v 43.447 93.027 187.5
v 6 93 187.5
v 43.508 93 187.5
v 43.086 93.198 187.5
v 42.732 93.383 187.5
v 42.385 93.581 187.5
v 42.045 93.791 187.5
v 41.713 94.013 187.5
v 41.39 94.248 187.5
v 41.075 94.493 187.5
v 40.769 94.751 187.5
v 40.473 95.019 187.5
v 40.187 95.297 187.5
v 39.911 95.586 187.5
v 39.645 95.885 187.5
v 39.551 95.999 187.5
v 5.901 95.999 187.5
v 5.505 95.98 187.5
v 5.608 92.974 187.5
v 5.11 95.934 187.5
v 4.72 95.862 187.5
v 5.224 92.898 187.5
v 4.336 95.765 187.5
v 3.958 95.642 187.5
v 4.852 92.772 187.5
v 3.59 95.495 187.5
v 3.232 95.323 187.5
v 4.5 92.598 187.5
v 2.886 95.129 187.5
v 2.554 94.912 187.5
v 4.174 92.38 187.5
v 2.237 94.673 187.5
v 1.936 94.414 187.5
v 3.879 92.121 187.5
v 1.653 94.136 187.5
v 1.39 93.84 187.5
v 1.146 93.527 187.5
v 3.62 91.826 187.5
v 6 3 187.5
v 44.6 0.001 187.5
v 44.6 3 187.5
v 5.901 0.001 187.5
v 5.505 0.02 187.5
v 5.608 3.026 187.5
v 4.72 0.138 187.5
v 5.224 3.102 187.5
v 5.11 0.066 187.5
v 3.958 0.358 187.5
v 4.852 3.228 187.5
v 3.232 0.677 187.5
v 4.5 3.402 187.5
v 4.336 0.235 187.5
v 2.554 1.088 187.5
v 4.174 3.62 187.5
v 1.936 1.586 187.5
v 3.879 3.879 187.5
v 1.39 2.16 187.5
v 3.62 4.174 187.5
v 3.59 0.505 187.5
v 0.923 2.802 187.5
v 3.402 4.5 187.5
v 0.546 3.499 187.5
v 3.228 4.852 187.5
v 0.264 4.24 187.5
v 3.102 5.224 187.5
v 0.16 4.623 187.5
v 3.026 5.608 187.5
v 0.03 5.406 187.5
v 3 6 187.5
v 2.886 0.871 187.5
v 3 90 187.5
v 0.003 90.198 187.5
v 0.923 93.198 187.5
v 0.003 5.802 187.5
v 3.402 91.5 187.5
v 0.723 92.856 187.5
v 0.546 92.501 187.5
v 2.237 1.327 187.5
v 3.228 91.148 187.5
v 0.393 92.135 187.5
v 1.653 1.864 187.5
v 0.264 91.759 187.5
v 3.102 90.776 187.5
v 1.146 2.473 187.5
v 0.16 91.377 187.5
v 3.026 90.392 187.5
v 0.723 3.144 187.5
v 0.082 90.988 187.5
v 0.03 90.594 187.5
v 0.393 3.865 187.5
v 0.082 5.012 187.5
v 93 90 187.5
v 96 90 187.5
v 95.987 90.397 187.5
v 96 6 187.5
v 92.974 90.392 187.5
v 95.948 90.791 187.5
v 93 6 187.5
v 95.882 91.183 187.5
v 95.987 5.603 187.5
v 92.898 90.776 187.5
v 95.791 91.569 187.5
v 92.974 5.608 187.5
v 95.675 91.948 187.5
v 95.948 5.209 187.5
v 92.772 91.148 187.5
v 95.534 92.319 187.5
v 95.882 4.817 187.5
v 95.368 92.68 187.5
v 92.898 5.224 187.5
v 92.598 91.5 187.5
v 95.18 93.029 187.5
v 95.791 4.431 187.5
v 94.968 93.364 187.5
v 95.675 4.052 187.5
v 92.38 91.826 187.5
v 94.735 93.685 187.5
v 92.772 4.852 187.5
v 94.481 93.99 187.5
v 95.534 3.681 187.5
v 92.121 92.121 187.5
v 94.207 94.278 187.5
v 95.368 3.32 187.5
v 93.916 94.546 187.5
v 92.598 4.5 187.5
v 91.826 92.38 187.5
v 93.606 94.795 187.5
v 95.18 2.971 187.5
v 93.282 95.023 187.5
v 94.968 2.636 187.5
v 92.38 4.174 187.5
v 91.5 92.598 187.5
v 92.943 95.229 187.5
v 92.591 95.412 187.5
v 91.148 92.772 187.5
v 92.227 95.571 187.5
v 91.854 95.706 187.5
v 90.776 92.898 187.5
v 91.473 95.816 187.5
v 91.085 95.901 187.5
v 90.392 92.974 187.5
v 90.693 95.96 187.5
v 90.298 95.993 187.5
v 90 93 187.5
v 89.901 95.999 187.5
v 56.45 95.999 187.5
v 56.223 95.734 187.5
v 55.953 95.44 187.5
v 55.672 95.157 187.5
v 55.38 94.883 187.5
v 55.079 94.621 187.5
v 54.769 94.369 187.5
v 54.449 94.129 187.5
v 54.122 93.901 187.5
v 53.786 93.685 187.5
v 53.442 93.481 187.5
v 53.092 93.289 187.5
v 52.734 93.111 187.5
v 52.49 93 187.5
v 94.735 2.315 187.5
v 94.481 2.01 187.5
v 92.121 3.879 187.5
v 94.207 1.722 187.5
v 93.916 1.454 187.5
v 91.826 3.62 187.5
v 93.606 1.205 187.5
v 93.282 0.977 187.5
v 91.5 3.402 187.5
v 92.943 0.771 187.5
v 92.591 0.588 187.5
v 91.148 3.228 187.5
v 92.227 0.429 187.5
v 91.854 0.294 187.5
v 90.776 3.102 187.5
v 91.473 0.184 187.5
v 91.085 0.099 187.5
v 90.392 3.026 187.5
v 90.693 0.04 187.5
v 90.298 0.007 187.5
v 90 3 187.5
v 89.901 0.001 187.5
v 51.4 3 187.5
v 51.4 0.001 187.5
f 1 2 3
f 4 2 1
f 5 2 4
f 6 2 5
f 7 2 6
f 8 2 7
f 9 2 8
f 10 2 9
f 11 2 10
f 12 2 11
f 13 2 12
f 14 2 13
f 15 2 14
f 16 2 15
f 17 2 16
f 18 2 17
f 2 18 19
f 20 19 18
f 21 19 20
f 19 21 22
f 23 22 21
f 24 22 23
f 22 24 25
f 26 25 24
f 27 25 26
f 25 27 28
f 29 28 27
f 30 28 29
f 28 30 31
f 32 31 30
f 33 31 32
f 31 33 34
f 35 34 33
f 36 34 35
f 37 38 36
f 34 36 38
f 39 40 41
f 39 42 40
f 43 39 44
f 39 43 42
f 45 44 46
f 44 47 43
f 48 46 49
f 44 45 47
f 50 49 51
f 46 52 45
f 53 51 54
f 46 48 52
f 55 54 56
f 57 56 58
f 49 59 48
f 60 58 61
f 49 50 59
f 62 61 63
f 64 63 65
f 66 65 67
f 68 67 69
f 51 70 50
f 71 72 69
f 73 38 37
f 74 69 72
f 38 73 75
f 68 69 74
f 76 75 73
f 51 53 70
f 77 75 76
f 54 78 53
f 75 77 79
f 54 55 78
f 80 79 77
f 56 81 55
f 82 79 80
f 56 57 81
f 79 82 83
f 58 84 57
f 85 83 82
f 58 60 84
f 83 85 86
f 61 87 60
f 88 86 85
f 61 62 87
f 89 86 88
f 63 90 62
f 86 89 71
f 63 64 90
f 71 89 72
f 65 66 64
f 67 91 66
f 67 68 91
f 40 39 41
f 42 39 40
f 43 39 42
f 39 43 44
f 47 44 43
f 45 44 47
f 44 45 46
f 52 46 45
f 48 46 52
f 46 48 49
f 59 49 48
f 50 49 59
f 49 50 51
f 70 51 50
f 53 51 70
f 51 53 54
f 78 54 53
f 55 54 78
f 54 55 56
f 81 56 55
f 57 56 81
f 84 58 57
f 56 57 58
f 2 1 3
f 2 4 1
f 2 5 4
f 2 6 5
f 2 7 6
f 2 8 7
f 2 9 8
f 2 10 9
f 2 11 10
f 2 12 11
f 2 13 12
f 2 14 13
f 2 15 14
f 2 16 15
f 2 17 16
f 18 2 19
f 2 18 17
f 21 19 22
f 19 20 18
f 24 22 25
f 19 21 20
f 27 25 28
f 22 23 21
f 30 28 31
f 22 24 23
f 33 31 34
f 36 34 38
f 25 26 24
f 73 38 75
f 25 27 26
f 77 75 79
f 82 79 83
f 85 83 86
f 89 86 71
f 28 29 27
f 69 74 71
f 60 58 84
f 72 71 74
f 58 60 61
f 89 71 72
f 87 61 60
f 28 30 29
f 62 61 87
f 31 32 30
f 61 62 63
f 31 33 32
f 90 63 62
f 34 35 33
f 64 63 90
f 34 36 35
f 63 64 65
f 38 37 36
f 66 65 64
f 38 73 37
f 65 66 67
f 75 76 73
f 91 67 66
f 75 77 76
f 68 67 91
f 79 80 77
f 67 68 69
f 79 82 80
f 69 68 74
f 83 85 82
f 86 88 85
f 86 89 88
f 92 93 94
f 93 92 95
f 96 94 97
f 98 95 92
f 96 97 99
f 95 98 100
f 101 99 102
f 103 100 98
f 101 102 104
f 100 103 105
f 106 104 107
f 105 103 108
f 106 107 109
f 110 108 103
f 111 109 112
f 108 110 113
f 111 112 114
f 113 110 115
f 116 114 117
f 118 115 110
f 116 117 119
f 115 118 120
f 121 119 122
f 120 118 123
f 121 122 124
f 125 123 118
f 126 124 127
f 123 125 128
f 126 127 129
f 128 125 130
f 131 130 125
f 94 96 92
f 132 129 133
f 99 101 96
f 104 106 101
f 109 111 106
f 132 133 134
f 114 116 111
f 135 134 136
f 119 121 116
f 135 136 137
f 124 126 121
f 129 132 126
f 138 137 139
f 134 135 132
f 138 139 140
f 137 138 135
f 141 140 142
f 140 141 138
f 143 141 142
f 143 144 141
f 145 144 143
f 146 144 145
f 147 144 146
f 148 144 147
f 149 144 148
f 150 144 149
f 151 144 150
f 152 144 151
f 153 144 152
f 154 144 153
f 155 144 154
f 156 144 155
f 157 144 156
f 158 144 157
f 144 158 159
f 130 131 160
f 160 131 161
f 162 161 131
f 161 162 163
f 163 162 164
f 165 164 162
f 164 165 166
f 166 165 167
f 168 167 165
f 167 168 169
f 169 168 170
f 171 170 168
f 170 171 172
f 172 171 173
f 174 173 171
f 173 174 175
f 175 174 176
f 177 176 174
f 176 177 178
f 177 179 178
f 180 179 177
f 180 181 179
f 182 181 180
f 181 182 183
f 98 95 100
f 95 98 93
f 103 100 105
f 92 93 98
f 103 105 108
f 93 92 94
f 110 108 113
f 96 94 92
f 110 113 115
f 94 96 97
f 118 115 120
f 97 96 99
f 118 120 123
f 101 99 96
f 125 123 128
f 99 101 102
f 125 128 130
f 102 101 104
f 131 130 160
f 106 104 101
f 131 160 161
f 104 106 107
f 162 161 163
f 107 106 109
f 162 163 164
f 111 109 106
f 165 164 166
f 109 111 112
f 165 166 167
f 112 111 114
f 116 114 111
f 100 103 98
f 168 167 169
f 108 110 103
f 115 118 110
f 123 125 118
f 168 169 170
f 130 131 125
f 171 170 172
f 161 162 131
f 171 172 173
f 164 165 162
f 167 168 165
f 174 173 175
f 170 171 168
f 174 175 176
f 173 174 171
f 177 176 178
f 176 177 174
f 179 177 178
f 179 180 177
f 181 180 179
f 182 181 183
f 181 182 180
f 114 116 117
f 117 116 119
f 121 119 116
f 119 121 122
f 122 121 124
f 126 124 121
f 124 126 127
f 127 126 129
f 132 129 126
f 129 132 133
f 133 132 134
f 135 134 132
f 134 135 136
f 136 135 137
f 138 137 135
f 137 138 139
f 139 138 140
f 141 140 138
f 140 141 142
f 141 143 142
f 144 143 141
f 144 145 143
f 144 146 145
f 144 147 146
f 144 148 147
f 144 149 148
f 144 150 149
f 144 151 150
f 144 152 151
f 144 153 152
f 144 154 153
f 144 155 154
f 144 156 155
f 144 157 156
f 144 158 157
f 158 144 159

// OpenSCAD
// file: lid.scad
// ─────────────────────────────────────────────────────────────
//  Chamber lid — plate seats on the chamber rim, spigot locates
//  it in the cavity, fill collar points DOWN into the headspace.
//
//  PRINT PLATE-TOP-DOWN (the smooth face on the bed). Spigot and
//  collar both rise from the bed: zero overhangs, and the seating
//  face is a bed-flat surface rather than a drooping ledge.
//
//  Origin is the plate's underside = the chamber rim.
// ─────────────────────────────────────────────────────────────
include <params.scad>

fill_port_d   = 38;
fill_collar_h = 8;
fill_wall     = 2.5;

spigot        = ch_inner - 2*lid_fit;
fill_cx       = ch_outer/2;
fill_cy       = ch_outer*0.34;
vent_ring_r   = fill_port_d/2 + fill_wall + 5;

module lid() {
    difference() {
        union() {
            translate([0, 0, 0])
                rbox(ch_outer, ch_outer, lid_t, ch_corner_r);
            // locating spigot, into the cavity
            translate([(ch_outer - spigot)/2, (ch_outer - spigot)/2, -lid_spigot_h])
                rbox(spigot, spigot, lid_spigot_h + eps, max(ch_corner_r - ch_wall, 1));
            // fill collar, downward
            translate([fill_cx, fill_cy, -fill_collar_h])
                cylinder(d = fill_port_d + 2*fill_wall, h = fill_collar_h + eps);
        }
        // fill port
        translate([fill_cx, fill_cy, -fill_collar_h - eps])
            cylinder(d = fill_port_d, h = fill_collar_h + lid_t + 2*eps);
        // make-up air vents
        translate([fill_cx, fill_cy, -lid_spigot_h - eps])
            for (i = [0 : vent_n - 1])
                rotate([0, 0, i*360/vent_n])
                    translate([vent_ring_r, 0, 0])
                        cylinder(d = vent_d, h = lid_spigot_h + lid_t + 2*eps);
        // cable notch, aligned with the chamber's
        translate([ch_outer/2 - cable_notch_w/2, -eps, -lid_spigot_h - eps])
            cube([cable_notch_w, ch_wall + eps, lid_spigot_h + lid_t + 2*eps]);
        // finger cutout for lifting
        translate([ch_outer/2, ch_outer + lid_finger_d*0.32, -lid_spigot_h - eps])
            cylinder(d = lid_finger_d, h = lid_spigot_h + lid_t + 2*eps);
    }
}

lid();
// file: chamber.scad
// ─────────────────────────────────────────────────────────────
//  Fog chamber — holds the mist maker under its water column.
//  Prints upright, open side up: no support anywhere.
//  Material: PETG, 100 um, >=4 perimeters, >=40% infill.
// ─────────────────────────────────────────────────────────────
include <params.scad>

mark_len_fill   = 30;   // longer rib = FILL TO HERE
mark_len_refill = 16;   // shorter rib = REFILL WHEN LEVEL REACHES HERE
mark_out        = 0.8;  // protrusion into the cavity
mark_h          = 1.5;

module chamber() {
    difference() {
        union() {
            rbox(ch_outer, ch_outer, ch_floor + ch_inner_h, ch_corner_r);
            // fog outlet spigot (teardrop = self-supporting)
            translate([ch_outer/2, ch_outer - eps, ch_floor + fog_port_z])
                teardrop(fog_port_d + 2*fog_boss_wall, fog_boss_len);
            // level ribs, RAISED on the inner wall so they neither thin the
            // wall nor trap grime, and are visible with the lid off
            for (m = [[water_fill, mark_len_fill], [water_refill, mark_len_refill]])
                translate([ch_wall, ch_outer/2 - m[1]/2, ch_floor + m[0]])
                    cube([mark_out, m[1], mark_h]);
        }

        // cavity
        translate([ch_wall, ch_wall, ch_floor])
            rbox(ch_inner, ch_inner, ch_inner_h + eps, max(ch_corner_r - ch_wall, 1));


        // fog outlet bore
        translate([ch_outer/2, ch_inner/2, ch_floor + fog_port_z])
            teardrop(fog_port_d, ch_outer);

        // module locating recess
        translate([ch_outer/2, ch_outer/2, -eps])
            cylinder(d = mm_module_od + 1.0, h = mm_recess_d + eps);

        // cable exit notch in the rim — no wall penetration below water
        translate([ch_outer/2 - cable_notch_w/2, -eps,
                   ch_floor + ch_inner_h - cable_notch_h])
            cube([cable_notch_w, ch_wall + 2*eps, cable_notch_h + eps]);
    }
}

chamber();
// file: params.scad
// ─────────────────────────────────────────────────────────────
//  Automated Snail Terrarium — shared parameters
//  Every dimension in the project comes from here. Change a
//  number, re-run ./build.sh, get new STLs.
//
//  CONFIRMED  = verified from a datasheet / vendor spec
//  ASSUMED    = sensible default, safe to print but verify
//  MEASURE    = must be measured before ordering prints
// ─────────────────────────────────────────────────────────────

// ── Mist maker module ────────────────────────────────────────
// CONFIRMED from the vendor spec (eshop.eca.ir, 550 ml/h unit):
//   Operating voltage      24 V DC
//   Atomization rate       >=550 ml/h
//   Effective water level  20-75 mm            <-- 55 mm wide band
//   Operating temperature  5-45 C
//   Head diameter          45 mm
//   Module height          45 mm
//   Cable                  1400 +/-20 mm, 3.8 mm OD, black PVC
//   Connector              DC female 5.5 x 2.1 mm
mm_module_od      = 45;    // CONFIRMED head diameter
mm_module_h       = 45;    // CONFIRMED module height
mm_cable_od       = 3.8;   // CONFIRMED
water_min         = 20;    // CONFIRMED min effective level above the module
water_max         = 75;    // CONFIRMED max effective level above the module

// ── Water column ─────────────────────────────────────────────
// The 55 mm band is wide enough that the level may simply drift
// between refills. No Mariotte reservoir required - see
// ../DESIGN-DECISIONS.md.
//
// Levels are referenced to the module's TOP FACE, not the chamber
// floor: the module sits mm_recess_d down in its locating recess.
mm_recess_d       = 1.5;   // locating recess depth in the floor
module_top        = mm_module_h - mm_recess_d;   // above chamber floor
water_margin_hi   = 2;     // stay below the 75 mm ceiling
water_margin_lo   = 5;     // stay above the 20 mm floor (dry-run guard)
water_fill        = module_top + water_max - water_margin_hi;
water_refill      = module_top + water_min + water_margin_lo;
fog_headspace     = 68;    // air space above fill line (also keeps the fog
                           // port tip clear of the lid rebate)

// ── Chamber ──────────────────────────────────────────────────
ch_inner          = 90;    // internal square footprint
ch_wall           = 3.0;   // wall thickness (PETG, 100 um, watertight)
ch_floor          = 3.0;
ch_inner_h        = water_fill + fog_headspace;
ch_corner_r       = 6;     // external corner radius
ch_outer          = ch_inner + 2*ch_wall;

// ── Fog outlet ───────────────────────────────────────────────
fog_port_d        = 32;    // duct bore
fog_port_z        = water_fill + 30;   // centre height above floor
fog_boss_len      = 12;    // outward spigot for the duct/hose
fog_boss_wall     = 2.5;

// ── Lid ──────────────────────────────────────────────────────
// The lid is a full-footprint plate that SEATS ON THE RIM - a real
// 3 mm annulus - and is located laterally by a spigot dipping into
// the cavity. No rebate: a rebate cut into a 3 mm wall leaves only
// a 0.35 mm ledge, which is not a seat.
//
// Print it PLATE-TOP-DOWN. The spigot and the fill collar then both
// rise from the bed and there is not a single overhang on the part.
// That is why the fill collar points DOWN in use.
lid_t             = 4.0;   // plate thickness
lid_spigot_h      = 5.0;   // how far the spigot dips into the cavity
lid_clear         = 0.35;  // print clearance, service-FDM friendly
lid_fit           = 0.30;  // spigot-to-cavity side clearance
lid_finger_d      = 22;    // lift cutout in the plate edge
lid_rim_seat      = (ch_outer - ch_inner)/2;   // seating annulus width
vent_d            = 5;     // make-up air inlets
vent_n            = 6;
cable_notch_w     = mm_cable_od + 3;
cable_notch_h     = 6;
lid_pos_xy        = 0;     // seated position: flush with the chamber footprint
lid_pos_z         = ch_floor + ch_inner_h;

// ── Terrarium ────────────────────────────────────────────────
tank_w            = 460;   // MEASURE  is 46x28x37 external or internal?
tank_d            = 280;
tank_h            = 370;
glass_t           = 5.0;   // MEASURE  rim thickness for the hang-on bracket


// ── Rendering ────────────────────────────────────────────────
$fa = 2; $fs = 0.4;
eps = 0.01;

// ── Helpers ──────────────────────────────────────────────────
module rbox(w, d, h, r) {          // rounded-corner box, flat top/bottom
    hull() for (x = [r, w-r], y = [r, d-r])
        translate([x, y, 0]) cylinder(r = r, h = h);
}

module teardrop(d, len) {          // support-free horizontal hole
    r = d/2;
    rotate([-90, 0, 0]) linear_extrude(len) union() {
        circle(r = r);
        polygon([[-r*0.707, -r*0.707], [r*0.707, -r*0.707], [0, -r*1.42]]);
    }
}

// ── Capacity report (printed at render time) ──────────────────
usable_ml = ch_inner*ch_inner*(water_fill-water_refill)/1000;
full_ml   = ch_inner*ch_inner*water_fill/1000;
echo(str("chamber ", ch_outer, " x ", ch_outer, " x ", ch_floor+ch_inner_h, " mm"));
echo(str("water fill line ", water_fill, " mm / refill line ", water_refill, " mm"));
echo(str("usable ", usable_ml, " ml -> ", usable_ml/20, " days at 20 ml/day"));
echo(str("full mass ~", full_ml/1000, " kg of water"));
// main file
// Interference solid: lid seated on the chamber. Must be empty.
include <params.scad>
use <chamber.scad>
use <lid.scad>
intersection() {
    chamber();
    translate([lid_pos_xy, lid_pos_xy, lid_pos_z]) lid();
}
